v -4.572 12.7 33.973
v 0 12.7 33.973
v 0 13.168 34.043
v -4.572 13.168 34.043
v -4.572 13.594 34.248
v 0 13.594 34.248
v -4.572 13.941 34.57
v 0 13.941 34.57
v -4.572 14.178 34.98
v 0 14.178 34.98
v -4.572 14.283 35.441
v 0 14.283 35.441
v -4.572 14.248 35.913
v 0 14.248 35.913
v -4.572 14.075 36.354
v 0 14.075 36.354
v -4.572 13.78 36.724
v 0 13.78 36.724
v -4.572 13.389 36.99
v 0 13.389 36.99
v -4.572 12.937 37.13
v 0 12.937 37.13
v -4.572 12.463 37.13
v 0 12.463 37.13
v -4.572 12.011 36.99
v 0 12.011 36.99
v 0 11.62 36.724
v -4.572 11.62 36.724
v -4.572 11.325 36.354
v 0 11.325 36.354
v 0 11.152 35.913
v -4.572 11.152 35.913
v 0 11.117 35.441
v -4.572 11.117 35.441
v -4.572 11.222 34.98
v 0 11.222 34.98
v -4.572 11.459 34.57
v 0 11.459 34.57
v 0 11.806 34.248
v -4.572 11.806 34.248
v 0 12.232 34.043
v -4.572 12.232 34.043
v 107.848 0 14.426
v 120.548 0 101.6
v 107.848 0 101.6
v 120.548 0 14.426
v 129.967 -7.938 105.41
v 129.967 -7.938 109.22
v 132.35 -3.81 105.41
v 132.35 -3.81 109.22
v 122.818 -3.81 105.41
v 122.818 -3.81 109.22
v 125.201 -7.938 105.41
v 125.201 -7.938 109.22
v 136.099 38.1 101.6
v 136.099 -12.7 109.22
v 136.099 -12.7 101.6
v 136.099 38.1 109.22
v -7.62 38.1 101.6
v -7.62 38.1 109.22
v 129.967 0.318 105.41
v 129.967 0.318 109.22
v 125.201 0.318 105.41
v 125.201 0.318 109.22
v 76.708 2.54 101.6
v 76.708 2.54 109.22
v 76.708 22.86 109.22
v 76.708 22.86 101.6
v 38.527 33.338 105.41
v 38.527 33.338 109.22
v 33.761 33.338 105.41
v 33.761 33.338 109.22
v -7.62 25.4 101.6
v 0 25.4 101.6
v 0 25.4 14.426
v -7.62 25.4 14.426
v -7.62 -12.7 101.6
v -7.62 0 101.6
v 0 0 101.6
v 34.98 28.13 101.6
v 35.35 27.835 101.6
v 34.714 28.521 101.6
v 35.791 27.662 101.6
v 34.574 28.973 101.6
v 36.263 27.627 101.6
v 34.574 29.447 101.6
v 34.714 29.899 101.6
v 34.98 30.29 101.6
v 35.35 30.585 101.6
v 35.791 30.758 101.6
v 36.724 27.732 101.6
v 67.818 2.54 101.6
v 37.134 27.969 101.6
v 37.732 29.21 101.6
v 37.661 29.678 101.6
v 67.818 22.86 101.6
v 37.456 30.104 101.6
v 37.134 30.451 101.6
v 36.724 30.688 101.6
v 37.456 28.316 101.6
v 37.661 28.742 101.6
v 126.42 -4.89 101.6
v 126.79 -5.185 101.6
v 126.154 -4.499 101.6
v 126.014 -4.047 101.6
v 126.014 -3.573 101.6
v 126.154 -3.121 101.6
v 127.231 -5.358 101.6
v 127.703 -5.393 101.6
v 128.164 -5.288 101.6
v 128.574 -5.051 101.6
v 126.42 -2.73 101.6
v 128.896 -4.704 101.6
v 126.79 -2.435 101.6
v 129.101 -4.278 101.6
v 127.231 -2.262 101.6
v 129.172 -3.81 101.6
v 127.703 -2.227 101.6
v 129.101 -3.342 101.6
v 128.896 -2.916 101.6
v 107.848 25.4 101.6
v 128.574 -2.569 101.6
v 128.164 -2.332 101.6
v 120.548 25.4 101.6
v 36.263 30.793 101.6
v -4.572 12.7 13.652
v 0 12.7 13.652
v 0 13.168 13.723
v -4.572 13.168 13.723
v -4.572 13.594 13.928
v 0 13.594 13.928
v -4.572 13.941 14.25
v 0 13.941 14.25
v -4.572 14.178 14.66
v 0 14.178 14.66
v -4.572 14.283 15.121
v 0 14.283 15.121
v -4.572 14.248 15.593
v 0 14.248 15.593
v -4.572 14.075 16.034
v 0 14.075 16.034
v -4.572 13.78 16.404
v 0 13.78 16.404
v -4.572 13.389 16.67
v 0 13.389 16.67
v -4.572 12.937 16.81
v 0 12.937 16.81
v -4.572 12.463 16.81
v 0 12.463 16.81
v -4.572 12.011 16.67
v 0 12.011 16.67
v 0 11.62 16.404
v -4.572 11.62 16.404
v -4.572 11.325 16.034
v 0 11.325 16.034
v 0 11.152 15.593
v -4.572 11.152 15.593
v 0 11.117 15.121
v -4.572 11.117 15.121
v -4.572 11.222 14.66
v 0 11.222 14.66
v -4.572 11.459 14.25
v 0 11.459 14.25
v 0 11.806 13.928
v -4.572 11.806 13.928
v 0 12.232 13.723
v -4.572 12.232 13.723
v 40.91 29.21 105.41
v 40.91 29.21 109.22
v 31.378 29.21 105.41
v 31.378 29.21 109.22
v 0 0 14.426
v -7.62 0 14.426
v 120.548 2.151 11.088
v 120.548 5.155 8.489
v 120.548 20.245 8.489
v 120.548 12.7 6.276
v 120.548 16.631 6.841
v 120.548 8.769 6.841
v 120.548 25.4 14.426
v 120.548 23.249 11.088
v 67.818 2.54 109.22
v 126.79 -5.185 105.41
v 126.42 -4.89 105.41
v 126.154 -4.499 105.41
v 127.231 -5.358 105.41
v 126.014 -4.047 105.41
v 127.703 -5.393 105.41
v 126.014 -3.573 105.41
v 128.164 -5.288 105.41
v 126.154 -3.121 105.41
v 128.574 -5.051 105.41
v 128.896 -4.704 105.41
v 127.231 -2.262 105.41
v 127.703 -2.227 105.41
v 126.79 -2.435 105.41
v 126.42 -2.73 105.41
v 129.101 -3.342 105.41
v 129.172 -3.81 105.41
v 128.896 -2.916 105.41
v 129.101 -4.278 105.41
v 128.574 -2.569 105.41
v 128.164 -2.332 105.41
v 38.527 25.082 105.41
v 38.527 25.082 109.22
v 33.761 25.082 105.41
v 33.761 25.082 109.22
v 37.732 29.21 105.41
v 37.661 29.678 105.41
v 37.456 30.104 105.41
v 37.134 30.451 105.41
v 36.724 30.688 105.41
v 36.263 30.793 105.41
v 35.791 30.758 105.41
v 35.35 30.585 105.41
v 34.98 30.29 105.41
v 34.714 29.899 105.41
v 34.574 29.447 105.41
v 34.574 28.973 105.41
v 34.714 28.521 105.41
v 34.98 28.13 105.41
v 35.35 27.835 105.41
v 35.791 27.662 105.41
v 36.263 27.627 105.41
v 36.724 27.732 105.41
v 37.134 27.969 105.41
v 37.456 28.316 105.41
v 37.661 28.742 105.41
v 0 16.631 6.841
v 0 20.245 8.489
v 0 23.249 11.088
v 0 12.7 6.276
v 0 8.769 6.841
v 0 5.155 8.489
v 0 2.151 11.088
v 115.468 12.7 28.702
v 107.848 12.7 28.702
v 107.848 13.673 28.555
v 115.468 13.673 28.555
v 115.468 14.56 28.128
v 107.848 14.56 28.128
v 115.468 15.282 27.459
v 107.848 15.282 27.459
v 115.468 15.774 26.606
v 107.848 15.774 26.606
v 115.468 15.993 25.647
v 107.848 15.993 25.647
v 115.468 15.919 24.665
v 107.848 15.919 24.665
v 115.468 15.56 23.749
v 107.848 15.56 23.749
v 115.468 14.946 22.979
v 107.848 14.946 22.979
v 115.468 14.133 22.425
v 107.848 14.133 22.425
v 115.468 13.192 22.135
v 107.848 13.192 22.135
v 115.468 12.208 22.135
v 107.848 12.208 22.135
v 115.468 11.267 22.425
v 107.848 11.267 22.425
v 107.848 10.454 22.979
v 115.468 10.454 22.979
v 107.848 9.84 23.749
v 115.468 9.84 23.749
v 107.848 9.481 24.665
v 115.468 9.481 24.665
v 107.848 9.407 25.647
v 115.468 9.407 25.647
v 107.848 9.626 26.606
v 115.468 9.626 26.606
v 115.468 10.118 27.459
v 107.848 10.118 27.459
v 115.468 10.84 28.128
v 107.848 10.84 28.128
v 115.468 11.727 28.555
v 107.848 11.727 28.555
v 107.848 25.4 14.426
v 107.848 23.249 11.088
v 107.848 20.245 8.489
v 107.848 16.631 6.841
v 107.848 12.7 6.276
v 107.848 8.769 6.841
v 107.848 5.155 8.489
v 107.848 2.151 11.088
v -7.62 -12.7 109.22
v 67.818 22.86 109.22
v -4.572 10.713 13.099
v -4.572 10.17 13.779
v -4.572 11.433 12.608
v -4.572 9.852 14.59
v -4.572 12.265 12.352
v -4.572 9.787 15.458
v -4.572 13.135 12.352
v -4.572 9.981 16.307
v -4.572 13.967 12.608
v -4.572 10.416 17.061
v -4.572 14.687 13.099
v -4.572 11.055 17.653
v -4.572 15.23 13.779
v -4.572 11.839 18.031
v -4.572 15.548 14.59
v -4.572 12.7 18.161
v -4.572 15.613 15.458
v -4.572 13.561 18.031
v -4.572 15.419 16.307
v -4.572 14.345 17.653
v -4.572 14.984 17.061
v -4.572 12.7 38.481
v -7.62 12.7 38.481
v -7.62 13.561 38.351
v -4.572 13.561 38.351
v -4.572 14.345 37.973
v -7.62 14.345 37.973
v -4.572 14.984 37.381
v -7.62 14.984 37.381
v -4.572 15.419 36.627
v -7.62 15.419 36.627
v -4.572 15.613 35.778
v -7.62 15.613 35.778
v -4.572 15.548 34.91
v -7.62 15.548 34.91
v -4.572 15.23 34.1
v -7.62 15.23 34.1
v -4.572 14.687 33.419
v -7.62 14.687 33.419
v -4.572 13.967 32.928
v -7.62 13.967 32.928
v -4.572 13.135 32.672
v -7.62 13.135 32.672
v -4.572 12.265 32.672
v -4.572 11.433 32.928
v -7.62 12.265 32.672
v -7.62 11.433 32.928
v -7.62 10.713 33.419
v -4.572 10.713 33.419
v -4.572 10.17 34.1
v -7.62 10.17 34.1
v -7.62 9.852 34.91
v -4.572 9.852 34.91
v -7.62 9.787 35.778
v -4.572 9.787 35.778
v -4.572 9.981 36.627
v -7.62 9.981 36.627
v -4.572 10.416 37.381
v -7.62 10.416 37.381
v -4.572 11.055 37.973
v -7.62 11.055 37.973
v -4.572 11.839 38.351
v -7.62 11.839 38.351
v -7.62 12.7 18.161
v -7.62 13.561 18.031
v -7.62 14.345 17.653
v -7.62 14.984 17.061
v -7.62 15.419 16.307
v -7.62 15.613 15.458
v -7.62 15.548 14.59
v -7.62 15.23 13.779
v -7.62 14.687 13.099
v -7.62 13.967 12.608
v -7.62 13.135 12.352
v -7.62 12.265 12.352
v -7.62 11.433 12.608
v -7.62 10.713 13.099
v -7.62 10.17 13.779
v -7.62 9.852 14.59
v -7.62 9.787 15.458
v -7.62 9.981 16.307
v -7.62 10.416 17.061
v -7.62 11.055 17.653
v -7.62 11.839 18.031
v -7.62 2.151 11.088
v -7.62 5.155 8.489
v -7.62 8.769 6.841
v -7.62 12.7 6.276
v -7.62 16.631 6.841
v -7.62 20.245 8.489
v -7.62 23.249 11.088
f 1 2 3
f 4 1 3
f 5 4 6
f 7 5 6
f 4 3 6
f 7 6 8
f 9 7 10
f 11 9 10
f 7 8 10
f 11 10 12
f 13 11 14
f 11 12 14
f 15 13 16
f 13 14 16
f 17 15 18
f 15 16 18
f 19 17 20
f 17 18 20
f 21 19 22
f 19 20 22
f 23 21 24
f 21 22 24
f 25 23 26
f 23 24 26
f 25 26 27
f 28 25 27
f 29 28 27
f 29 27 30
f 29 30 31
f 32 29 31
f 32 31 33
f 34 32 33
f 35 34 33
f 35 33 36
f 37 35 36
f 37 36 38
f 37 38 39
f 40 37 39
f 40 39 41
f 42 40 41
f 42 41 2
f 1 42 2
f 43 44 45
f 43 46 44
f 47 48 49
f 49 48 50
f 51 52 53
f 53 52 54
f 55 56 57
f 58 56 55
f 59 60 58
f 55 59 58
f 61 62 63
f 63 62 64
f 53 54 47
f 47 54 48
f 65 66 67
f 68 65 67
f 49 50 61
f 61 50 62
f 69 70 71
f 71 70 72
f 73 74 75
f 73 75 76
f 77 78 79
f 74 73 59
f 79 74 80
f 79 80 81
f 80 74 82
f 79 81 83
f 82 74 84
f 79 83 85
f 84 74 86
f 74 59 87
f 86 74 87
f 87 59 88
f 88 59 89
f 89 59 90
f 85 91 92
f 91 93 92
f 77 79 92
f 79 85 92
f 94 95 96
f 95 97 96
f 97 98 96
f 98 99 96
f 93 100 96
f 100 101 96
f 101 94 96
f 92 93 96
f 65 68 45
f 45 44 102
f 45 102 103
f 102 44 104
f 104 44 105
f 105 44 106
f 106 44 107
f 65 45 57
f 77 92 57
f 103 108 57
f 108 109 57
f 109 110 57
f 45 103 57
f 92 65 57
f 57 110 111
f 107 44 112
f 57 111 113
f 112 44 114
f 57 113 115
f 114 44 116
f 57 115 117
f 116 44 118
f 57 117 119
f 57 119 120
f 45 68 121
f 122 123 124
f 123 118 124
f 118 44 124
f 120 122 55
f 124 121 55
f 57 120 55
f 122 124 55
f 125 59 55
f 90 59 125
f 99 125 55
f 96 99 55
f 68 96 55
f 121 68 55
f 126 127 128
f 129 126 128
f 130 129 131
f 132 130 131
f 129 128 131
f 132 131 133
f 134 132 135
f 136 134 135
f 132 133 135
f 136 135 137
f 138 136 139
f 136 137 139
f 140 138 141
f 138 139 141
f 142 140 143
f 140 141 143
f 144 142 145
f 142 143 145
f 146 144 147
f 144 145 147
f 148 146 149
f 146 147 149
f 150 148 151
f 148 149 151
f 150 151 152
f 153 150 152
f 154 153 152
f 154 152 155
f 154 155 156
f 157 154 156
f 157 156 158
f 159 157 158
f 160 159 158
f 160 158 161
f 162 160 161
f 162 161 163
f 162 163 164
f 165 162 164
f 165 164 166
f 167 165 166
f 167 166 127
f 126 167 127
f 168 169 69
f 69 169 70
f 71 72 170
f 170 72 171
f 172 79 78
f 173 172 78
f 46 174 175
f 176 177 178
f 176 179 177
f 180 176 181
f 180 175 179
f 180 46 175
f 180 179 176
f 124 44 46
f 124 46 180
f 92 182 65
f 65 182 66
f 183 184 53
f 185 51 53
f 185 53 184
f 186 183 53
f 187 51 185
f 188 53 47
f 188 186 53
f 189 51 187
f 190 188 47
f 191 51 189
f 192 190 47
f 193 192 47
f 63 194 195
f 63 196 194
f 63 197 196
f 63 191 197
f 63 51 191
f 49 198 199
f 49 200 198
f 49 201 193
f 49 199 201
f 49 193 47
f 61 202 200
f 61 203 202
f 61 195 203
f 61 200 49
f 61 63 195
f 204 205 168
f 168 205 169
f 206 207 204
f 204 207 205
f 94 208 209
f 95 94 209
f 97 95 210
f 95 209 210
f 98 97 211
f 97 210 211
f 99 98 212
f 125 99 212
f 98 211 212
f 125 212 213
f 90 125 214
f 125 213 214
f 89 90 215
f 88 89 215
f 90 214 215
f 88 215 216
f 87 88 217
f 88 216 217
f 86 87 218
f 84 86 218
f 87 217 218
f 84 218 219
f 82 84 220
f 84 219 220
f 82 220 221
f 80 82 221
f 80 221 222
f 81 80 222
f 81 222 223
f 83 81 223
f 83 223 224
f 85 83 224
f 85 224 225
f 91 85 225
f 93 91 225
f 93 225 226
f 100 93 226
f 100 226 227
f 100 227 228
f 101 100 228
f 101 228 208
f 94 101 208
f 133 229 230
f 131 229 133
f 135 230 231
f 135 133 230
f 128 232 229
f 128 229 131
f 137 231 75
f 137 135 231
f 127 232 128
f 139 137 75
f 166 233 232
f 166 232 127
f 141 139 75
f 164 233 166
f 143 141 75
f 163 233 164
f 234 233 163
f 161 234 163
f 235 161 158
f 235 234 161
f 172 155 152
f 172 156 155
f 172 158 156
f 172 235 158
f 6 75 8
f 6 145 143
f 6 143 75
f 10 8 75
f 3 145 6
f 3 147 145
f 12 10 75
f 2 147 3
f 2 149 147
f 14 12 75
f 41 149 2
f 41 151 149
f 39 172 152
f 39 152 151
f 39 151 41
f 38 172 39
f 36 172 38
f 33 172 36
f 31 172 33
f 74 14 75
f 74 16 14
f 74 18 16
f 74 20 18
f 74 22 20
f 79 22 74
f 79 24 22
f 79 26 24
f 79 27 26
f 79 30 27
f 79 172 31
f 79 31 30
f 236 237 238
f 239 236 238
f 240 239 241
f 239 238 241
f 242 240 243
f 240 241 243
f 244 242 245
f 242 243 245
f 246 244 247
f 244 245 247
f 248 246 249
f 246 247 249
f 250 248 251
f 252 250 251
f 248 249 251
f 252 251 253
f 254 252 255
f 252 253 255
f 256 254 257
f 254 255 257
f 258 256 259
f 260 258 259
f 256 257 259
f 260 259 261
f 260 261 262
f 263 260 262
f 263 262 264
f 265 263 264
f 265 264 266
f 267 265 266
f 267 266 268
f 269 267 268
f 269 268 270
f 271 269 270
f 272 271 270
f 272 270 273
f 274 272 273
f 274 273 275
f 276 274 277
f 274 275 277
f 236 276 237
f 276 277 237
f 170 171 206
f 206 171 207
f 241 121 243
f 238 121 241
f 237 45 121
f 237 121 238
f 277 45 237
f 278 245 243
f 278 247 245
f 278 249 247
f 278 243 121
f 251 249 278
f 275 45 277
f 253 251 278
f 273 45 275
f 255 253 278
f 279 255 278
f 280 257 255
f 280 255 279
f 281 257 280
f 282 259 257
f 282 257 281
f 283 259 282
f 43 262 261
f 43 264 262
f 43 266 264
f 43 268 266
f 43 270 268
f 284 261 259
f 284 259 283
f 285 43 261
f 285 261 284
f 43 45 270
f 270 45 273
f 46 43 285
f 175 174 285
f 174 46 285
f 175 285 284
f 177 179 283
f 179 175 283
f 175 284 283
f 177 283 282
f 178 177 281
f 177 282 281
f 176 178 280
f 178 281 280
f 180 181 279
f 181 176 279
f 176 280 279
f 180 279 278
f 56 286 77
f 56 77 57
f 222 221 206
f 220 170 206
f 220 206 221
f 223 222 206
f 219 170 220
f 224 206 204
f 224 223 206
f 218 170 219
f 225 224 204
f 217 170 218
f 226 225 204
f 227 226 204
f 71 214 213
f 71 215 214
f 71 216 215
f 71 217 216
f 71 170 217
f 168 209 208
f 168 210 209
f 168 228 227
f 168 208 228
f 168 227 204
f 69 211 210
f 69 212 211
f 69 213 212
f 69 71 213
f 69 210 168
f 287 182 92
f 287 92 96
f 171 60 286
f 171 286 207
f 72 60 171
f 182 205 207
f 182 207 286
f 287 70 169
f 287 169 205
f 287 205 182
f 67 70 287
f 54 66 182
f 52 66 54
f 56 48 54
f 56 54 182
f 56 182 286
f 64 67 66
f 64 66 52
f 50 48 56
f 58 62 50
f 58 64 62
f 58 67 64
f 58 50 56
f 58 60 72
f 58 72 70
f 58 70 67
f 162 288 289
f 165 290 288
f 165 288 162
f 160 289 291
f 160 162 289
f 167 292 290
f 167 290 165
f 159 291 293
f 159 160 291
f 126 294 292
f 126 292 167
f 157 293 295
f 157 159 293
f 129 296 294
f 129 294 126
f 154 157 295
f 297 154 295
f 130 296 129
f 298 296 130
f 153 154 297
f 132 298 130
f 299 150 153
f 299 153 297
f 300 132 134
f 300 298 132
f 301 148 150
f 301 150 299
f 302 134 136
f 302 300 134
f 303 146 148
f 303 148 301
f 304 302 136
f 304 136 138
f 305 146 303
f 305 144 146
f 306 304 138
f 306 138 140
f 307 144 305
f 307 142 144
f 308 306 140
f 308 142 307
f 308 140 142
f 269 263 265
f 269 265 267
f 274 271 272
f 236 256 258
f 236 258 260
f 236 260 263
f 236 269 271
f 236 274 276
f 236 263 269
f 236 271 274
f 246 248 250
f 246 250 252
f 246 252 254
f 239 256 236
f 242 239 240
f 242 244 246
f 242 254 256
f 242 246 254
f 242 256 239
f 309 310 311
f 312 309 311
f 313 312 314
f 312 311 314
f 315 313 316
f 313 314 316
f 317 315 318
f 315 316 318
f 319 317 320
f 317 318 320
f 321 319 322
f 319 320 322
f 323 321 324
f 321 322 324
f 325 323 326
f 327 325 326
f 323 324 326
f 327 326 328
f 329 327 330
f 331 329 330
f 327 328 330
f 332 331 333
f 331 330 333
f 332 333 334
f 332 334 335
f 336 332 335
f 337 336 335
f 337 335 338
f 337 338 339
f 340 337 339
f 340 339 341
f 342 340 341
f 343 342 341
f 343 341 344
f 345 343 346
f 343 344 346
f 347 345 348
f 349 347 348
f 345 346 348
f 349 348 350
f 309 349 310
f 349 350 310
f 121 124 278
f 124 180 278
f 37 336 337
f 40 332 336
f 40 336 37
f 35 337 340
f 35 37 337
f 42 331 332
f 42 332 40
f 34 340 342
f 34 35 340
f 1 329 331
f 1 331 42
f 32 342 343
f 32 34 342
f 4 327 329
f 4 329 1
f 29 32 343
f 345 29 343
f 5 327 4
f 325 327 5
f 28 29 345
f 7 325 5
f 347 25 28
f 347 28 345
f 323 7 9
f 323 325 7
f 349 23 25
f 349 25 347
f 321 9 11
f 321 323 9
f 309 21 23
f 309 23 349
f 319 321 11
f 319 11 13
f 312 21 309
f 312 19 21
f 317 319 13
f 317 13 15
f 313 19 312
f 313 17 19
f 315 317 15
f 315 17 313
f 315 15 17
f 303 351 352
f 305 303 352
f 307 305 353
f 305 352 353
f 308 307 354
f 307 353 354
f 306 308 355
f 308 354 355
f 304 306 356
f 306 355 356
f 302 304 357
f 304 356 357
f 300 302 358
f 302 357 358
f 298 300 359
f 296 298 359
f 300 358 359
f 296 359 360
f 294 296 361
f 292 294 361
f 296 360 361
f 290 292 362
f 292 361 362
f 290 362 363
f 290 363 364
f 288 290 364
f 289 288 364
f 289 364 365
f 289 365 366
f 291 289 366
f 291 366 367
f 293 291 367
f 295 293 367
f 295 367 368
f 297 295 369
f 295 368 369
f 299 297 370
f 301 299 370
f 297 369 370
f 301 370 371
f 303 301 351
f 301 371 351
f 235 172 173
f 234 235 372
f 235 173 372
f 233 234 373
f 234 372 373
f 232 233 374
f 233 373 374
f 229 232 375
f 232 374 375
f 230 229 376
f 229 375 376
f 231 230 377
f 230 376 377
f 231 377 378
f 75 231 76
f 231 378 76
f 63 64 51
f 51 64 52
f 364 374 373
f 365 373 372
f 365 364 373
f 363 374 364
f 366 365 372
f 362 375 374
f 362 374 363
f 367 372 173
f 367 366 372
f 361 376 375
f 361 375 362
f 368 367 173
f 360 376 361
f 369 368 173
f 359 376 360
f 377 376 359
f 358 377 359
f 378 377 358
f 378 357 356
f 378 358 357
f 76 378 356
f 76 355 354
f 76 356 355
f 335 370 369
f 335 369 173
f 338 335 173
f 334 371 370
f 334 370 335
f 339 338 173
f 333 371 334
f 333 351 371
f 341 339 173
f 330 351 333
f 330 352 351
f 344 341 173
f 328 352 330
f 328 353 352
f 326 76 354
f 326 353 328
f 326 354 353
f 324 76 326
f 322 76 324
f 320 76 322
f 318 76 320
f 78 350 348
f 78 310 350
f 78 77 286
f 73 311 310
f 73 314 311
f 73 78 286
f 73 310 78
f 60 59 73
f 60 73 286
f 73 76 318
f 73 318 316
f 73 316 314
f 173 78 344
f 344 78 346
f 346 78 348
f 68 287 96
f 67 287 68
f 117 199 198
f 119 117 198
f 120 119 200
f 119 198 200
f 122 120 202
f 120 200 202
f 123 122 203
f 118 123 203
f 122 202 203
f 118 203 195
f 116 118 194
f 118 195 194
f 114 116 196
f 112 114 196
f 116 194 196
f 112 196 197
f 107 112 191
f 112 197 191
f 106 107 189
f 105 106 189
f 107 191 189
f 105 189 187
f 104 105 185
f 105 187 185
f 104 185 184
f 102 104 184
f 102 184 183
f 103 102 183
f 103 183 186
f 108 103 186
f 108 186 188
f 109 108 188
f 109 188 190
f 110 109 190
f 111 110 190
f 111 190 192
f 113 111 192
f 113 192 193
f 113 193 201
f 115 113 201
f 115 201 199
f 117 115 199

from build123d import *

# Parameters (mm, degrees)
BOSS_EXTRUDE1_DEPTH     = 25.4
SKETCH4_R               = 3.302
CUT_EXTRUDE2_DEPTH      = 7.62
SKETCH2_R               = 3.175
SKETCH2_R_2             = 1.5875
CUT_EXTRUDE3_DEPTH      = 7.62
SKETCH6_W               = 128.1684
SKETCH6_H               = 12.7
BOSS_EXTRUDE2_DEPTH     = 7.62
SKETCH9_W               = 15.550542335
SKETCH9_H               = 50.8
BOSS_EXTRUDE3_DEPTH     = 7.62
CUT_EXTRUDE4_DEPTH      = 3.81
SKETCH10_R              = 2.921
CUT_EXTRUDE5_DEPTH      = 3.048
SKETCH11_R              = 1.5875
CUT_EXTRUDE6_DEPTH      = 106.41
CUT_EXTRUDE7_REACH      = 111.22
SKETCH12_W              = 8.89
SKETCH12_H              = 20.32
SKETCH13_R              = 3.175
BOSS_EXTRUDE4_DEPTH     = 7.62
CUT_EXTRUDE8_DEPTH      = 1
CUT_EXTRUDE8_DEPTH_BACK = 144.718942335


with BuildPart() as part:
    # Sketch1 → Boss-Extrude1 (new body)
    with BuildSketch(Plane(origin=(0, 0, 0), x_dir=(1, 0, 0), z_dir=(0, 1, 0))):
        Polygon((0, 0), (0, -101.6), (107.8484, -101.6), (107.8484, 0), (120.5484, 0), (120.5484, -109.22), (-7.62, -109.22), (-7.62, 0), align=None)
    extrude(amount=BOSS_EXTRUDE1_DEPTH)

    # Sketch4 → Cut-Extrude2 (cut)
    with BuildSketch(Plane.ZY.offset(-107.8484)):
        with Locations((25.4, 12.7)):
            Circle(SKETCH4_R)
    extrude(amount=-CUT_EXTRUDE2_DEPTH, mode=Mode.SUBTRACT)

    # Sketch2 → Cut-Extrude3 (cut)
    with BuildSketch(Plane(origin=(0, 0, 0), x_dir=(0, 0, -1), z_dir=(1, 0, 0))):
        with Locations((-25.4, 12.7)):
            Circle(SKETCH2_R)
        with Locations((-15.24, 12.7)):
            Circle(SKETCH2_R_2)
        with Locations((-35.56, 12.7)):
            Circle(SKETCH2_R_2)
    extrude(amount=-CUT_EXTRUDE3_DEPTH, mode=Mode.SUBTRACT)

    # Sketch6 → Boss-Extrude2 (add)
    with BuildSketch(Plane.XY.offset(109.22)):
        with Locations((56.4642, 31.75)):
            Rectangle(SKETCH6_W, SKETCH6_H)
        with Locations((56.4642, -6.35)):
            Rectangle(SKETCH6_W, SKETCH6_H)
    extrude(amount=-BOSS_EXTRUDE2_DEPTH)

    # Sketch9 → Boss-Extrude3 (add)
    with BuildSketch(Plane.XY.offset(109.22)):
        with Locations((128.323671168, 12.7)):
            Rectangle(SKETCH9_W, SKETCH9_H)
    extrude(amount=-BOSS_EXTRUDE3_DEPTH)

    # Sketch7 → Cut-Extrude4 (cut)
    with BuildSketch(Plane.XY.offset(109.22)):
        Polygon((40.910226472, 29.21), (38.527213236, 33.3375), (33.761186764, 33.3375), (31.378173528, 29.21), (33.761186764, 25.0825), (38.527213236, 25.0825), align=None)
        Polygon((132.350226472, -3.81), (129.967213236, 0.3175), (125.201186764, 0.3175), (122.818173528, -3.81), (125.201186764, -7.9375), (129.967213236, -7.9375), align=None)
    extrude(amount=-CUT_EXTRUDE4_DEPTH, mode=Mode.SUBTRACT)

    # Sketch10 → Cut-Extrude5 (cut)
    with BuildSketch(Plane.ZY.offset(7.62)):
        with Locations((15.24, 12.7)):
            Circle(SKETCH10_R)
        with Locations((35.56, 12.7)):
            Circle(SKETCH10_R)
    extrude(amount=-CUT_EXTRUDE5_DEPTH, mode=Mode.SUBTRACT)

    # Sketch11 → Cut-Extrude6 (cut, through all)
    with BuildSketch(Plane.XY.offset(105.41)):
        with Locations((36.1442, 29.21)):
            Circle(SKETCH11_R)
        with Locations((127.5842, -3.81)):
            Circle(SKETCH11_R)
    extrude(amount=-CUT_EXTRUDE6_DEPTH, mode=Mode.SUBTRACT)

    # Sketch12 → Cut-Extrude7 (cut, up to next)
    with BuildSketch(Plane.XY.offset(109.22), mode=Mode.PRIVATE) as cut_extrude7_sk1:
        with Locations((72.263, 12.7)):
            Rectangle(SKETCH12_W, SKETCH12_H)
    cut_extrude7_tool1 = extrude(cut_extrude7_sk1.sketch, amount=-CUT_EXTRUDE7_REACH, mode=Mode.PRIVATE) & part.part
    add(cut_extrude7_tool1.solids().sort_by_distance((72.263, 12.7, 109.22))[0], mode=Mode.SUBTRACT)

    # Sketch13 → Boss-Extrude4 (add)
    with BuildSketch(Plane.ZY.offset(7.62)):
        with Locations((25.4, 12.7)):
            Circle(SKETCH13_R)
    extrude(amount=-BOSS_EXTRUDE4_DEPTH)

    # Sketch14 → Cut-Extrude8 (cut, two sides)
    with BuildSketch(Plane.ZY.offset(7.62)) as cut_extrude8_sk:
        with BuildLine():
            Line((14.426351463, 25.4), (0, 25.4))
            Line((0, 25.4), (0, 0))
            Line((0, 0), (14.426351463, 0))
            ThreePointArc((14.426351463, 0), (6.276222595, 12.7), (14.426351463, 25.4))
        make_face()
    extrude(amount=CUT_EXTRUDE8_DEPTH, mode=Mode.SUBTRACT)
    extrude(cut_extrude8_sk.sketch, amount=-CUT_EXTRUDE8_DEPTH_BACK, mode=Mode.SUBTRACT)


solid = part.part
